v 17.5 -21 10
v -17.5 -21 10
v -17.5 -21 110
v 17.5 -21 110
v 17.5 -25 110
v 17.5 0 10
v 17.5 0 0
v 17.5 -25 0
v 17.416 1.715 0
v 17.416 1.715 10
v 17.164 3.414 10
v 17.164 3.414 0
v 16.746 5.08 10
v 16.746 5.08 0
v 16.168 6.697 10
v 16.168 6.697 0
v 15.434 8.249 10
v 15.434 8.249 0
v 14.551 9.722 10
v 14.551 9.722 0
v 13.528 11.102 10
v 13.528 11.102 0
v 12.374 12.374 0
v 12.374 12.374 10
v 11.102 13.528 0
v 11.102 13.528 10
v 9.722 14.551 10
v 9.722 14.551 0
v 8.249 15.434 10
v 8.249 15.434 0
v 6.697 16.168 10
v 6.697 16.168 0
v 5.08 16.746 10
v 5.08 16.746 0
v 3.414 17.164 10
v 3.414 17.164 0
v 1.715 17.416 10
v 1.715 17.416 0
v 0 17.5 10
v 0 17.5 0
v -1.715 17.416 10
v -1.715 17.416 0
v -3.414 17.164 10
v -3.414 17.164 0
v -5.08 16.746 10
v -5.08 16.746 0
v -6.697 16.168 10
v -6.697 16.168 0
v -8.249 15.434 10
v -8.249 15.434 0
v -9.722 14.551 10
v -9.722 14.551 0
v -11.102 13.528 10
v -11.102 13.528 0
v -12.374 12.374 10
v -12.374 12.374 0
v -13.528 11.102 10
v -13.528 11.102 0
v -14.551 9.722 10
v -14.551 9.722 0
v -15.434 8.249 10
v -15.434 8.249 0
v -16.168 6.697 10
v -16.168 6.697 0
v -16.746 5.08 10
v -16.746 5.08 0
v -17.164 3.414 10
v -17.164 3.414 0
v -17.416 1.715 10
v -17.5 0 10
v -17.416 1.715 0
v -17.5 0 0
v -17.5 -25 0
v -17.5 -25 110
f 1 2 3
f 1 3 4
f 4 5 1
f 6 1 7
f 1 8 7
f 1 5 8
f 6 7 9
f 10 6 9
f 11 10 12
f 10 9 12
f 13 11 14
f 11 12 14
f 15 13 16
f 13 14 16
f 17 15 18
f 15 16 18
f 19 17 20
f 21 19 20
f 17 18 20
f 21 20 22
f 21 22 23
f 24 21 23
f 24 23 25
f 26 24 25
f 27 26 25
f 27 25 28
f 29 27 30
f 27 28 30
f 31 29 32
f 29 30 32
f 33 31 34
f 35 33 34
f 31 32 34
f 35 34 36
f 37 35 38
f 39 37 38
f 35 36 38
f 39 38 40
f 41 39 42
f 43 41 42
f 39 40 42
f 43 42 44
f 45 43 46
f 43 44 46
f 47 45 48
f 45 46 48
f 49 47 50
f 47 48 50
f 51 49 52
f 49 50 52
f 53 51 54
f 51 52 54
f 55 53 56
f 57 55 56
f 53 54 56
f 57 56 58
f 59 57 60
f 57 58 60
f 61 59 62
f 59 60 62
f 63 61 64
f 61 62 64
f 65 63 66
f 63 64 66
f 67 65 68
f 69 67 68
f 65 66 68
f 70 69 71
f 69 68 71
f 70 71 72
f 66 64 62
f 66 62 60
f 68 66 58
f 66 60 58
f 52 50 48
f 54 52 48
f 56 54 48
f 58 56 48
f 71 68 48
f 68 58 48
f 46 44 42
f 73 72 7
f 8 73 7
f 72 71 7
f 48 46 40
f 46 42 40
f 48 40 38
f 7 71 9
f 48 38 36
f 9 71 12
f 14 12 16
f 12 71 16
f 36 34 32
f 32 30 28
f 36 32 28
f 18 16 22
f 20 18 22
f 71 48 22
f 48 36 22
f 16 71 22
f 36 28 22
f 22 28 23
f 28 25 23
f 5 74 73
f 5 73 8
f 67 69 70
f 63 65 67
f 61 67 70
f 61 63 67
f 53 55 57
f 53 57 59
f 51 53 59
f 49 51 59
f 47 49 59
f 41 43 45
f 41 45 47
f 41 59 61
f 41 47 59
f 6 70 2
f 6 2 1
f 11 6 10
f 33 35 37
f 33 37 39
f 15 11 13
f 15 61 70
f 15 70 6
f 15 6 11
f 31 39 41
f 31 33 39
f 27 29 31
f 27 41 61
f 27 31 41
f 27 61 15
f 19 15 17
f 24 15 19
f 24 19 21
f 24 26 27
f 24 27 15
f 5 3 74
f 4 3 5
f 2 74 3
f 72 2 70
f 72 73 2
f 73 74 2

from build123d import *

# Parameters (mm, degrees)
EXTRUDE_1_DEPTH = 10
SKETCH_2_W      = 35
SKETCH_2_H      = 4
EXTRUDE_2_DEPTH = 100


with BuildPart() as part:
    # 草图1 → 凸台-拉伸1 (new body)
    with BuildSketch(Plane.XY):
        with BuildLine():
            Line((-17.5, 0), (-17.5, -25))
            Line((-17.5, -25), (17.5, -25))
            Line((17.5, -25), (17.5, 0))
            ThreePointArc((17.5, 0), (0, 17.5), (-17.5, 0))
        make_face()
    extrude(amount=EXTRUDE_1_DEPTH)

    # 草图2 → 凸台-拉伸2 (add)
    with BuildSketch(Plane.XY.offset(10)):
        with Locations((0, -23)):
            Rectangle(SKETCH_2_W, SKETCH_2_H)
    extrude(amount=EXTRUDE_2_DEPTH)


solid = part.part
